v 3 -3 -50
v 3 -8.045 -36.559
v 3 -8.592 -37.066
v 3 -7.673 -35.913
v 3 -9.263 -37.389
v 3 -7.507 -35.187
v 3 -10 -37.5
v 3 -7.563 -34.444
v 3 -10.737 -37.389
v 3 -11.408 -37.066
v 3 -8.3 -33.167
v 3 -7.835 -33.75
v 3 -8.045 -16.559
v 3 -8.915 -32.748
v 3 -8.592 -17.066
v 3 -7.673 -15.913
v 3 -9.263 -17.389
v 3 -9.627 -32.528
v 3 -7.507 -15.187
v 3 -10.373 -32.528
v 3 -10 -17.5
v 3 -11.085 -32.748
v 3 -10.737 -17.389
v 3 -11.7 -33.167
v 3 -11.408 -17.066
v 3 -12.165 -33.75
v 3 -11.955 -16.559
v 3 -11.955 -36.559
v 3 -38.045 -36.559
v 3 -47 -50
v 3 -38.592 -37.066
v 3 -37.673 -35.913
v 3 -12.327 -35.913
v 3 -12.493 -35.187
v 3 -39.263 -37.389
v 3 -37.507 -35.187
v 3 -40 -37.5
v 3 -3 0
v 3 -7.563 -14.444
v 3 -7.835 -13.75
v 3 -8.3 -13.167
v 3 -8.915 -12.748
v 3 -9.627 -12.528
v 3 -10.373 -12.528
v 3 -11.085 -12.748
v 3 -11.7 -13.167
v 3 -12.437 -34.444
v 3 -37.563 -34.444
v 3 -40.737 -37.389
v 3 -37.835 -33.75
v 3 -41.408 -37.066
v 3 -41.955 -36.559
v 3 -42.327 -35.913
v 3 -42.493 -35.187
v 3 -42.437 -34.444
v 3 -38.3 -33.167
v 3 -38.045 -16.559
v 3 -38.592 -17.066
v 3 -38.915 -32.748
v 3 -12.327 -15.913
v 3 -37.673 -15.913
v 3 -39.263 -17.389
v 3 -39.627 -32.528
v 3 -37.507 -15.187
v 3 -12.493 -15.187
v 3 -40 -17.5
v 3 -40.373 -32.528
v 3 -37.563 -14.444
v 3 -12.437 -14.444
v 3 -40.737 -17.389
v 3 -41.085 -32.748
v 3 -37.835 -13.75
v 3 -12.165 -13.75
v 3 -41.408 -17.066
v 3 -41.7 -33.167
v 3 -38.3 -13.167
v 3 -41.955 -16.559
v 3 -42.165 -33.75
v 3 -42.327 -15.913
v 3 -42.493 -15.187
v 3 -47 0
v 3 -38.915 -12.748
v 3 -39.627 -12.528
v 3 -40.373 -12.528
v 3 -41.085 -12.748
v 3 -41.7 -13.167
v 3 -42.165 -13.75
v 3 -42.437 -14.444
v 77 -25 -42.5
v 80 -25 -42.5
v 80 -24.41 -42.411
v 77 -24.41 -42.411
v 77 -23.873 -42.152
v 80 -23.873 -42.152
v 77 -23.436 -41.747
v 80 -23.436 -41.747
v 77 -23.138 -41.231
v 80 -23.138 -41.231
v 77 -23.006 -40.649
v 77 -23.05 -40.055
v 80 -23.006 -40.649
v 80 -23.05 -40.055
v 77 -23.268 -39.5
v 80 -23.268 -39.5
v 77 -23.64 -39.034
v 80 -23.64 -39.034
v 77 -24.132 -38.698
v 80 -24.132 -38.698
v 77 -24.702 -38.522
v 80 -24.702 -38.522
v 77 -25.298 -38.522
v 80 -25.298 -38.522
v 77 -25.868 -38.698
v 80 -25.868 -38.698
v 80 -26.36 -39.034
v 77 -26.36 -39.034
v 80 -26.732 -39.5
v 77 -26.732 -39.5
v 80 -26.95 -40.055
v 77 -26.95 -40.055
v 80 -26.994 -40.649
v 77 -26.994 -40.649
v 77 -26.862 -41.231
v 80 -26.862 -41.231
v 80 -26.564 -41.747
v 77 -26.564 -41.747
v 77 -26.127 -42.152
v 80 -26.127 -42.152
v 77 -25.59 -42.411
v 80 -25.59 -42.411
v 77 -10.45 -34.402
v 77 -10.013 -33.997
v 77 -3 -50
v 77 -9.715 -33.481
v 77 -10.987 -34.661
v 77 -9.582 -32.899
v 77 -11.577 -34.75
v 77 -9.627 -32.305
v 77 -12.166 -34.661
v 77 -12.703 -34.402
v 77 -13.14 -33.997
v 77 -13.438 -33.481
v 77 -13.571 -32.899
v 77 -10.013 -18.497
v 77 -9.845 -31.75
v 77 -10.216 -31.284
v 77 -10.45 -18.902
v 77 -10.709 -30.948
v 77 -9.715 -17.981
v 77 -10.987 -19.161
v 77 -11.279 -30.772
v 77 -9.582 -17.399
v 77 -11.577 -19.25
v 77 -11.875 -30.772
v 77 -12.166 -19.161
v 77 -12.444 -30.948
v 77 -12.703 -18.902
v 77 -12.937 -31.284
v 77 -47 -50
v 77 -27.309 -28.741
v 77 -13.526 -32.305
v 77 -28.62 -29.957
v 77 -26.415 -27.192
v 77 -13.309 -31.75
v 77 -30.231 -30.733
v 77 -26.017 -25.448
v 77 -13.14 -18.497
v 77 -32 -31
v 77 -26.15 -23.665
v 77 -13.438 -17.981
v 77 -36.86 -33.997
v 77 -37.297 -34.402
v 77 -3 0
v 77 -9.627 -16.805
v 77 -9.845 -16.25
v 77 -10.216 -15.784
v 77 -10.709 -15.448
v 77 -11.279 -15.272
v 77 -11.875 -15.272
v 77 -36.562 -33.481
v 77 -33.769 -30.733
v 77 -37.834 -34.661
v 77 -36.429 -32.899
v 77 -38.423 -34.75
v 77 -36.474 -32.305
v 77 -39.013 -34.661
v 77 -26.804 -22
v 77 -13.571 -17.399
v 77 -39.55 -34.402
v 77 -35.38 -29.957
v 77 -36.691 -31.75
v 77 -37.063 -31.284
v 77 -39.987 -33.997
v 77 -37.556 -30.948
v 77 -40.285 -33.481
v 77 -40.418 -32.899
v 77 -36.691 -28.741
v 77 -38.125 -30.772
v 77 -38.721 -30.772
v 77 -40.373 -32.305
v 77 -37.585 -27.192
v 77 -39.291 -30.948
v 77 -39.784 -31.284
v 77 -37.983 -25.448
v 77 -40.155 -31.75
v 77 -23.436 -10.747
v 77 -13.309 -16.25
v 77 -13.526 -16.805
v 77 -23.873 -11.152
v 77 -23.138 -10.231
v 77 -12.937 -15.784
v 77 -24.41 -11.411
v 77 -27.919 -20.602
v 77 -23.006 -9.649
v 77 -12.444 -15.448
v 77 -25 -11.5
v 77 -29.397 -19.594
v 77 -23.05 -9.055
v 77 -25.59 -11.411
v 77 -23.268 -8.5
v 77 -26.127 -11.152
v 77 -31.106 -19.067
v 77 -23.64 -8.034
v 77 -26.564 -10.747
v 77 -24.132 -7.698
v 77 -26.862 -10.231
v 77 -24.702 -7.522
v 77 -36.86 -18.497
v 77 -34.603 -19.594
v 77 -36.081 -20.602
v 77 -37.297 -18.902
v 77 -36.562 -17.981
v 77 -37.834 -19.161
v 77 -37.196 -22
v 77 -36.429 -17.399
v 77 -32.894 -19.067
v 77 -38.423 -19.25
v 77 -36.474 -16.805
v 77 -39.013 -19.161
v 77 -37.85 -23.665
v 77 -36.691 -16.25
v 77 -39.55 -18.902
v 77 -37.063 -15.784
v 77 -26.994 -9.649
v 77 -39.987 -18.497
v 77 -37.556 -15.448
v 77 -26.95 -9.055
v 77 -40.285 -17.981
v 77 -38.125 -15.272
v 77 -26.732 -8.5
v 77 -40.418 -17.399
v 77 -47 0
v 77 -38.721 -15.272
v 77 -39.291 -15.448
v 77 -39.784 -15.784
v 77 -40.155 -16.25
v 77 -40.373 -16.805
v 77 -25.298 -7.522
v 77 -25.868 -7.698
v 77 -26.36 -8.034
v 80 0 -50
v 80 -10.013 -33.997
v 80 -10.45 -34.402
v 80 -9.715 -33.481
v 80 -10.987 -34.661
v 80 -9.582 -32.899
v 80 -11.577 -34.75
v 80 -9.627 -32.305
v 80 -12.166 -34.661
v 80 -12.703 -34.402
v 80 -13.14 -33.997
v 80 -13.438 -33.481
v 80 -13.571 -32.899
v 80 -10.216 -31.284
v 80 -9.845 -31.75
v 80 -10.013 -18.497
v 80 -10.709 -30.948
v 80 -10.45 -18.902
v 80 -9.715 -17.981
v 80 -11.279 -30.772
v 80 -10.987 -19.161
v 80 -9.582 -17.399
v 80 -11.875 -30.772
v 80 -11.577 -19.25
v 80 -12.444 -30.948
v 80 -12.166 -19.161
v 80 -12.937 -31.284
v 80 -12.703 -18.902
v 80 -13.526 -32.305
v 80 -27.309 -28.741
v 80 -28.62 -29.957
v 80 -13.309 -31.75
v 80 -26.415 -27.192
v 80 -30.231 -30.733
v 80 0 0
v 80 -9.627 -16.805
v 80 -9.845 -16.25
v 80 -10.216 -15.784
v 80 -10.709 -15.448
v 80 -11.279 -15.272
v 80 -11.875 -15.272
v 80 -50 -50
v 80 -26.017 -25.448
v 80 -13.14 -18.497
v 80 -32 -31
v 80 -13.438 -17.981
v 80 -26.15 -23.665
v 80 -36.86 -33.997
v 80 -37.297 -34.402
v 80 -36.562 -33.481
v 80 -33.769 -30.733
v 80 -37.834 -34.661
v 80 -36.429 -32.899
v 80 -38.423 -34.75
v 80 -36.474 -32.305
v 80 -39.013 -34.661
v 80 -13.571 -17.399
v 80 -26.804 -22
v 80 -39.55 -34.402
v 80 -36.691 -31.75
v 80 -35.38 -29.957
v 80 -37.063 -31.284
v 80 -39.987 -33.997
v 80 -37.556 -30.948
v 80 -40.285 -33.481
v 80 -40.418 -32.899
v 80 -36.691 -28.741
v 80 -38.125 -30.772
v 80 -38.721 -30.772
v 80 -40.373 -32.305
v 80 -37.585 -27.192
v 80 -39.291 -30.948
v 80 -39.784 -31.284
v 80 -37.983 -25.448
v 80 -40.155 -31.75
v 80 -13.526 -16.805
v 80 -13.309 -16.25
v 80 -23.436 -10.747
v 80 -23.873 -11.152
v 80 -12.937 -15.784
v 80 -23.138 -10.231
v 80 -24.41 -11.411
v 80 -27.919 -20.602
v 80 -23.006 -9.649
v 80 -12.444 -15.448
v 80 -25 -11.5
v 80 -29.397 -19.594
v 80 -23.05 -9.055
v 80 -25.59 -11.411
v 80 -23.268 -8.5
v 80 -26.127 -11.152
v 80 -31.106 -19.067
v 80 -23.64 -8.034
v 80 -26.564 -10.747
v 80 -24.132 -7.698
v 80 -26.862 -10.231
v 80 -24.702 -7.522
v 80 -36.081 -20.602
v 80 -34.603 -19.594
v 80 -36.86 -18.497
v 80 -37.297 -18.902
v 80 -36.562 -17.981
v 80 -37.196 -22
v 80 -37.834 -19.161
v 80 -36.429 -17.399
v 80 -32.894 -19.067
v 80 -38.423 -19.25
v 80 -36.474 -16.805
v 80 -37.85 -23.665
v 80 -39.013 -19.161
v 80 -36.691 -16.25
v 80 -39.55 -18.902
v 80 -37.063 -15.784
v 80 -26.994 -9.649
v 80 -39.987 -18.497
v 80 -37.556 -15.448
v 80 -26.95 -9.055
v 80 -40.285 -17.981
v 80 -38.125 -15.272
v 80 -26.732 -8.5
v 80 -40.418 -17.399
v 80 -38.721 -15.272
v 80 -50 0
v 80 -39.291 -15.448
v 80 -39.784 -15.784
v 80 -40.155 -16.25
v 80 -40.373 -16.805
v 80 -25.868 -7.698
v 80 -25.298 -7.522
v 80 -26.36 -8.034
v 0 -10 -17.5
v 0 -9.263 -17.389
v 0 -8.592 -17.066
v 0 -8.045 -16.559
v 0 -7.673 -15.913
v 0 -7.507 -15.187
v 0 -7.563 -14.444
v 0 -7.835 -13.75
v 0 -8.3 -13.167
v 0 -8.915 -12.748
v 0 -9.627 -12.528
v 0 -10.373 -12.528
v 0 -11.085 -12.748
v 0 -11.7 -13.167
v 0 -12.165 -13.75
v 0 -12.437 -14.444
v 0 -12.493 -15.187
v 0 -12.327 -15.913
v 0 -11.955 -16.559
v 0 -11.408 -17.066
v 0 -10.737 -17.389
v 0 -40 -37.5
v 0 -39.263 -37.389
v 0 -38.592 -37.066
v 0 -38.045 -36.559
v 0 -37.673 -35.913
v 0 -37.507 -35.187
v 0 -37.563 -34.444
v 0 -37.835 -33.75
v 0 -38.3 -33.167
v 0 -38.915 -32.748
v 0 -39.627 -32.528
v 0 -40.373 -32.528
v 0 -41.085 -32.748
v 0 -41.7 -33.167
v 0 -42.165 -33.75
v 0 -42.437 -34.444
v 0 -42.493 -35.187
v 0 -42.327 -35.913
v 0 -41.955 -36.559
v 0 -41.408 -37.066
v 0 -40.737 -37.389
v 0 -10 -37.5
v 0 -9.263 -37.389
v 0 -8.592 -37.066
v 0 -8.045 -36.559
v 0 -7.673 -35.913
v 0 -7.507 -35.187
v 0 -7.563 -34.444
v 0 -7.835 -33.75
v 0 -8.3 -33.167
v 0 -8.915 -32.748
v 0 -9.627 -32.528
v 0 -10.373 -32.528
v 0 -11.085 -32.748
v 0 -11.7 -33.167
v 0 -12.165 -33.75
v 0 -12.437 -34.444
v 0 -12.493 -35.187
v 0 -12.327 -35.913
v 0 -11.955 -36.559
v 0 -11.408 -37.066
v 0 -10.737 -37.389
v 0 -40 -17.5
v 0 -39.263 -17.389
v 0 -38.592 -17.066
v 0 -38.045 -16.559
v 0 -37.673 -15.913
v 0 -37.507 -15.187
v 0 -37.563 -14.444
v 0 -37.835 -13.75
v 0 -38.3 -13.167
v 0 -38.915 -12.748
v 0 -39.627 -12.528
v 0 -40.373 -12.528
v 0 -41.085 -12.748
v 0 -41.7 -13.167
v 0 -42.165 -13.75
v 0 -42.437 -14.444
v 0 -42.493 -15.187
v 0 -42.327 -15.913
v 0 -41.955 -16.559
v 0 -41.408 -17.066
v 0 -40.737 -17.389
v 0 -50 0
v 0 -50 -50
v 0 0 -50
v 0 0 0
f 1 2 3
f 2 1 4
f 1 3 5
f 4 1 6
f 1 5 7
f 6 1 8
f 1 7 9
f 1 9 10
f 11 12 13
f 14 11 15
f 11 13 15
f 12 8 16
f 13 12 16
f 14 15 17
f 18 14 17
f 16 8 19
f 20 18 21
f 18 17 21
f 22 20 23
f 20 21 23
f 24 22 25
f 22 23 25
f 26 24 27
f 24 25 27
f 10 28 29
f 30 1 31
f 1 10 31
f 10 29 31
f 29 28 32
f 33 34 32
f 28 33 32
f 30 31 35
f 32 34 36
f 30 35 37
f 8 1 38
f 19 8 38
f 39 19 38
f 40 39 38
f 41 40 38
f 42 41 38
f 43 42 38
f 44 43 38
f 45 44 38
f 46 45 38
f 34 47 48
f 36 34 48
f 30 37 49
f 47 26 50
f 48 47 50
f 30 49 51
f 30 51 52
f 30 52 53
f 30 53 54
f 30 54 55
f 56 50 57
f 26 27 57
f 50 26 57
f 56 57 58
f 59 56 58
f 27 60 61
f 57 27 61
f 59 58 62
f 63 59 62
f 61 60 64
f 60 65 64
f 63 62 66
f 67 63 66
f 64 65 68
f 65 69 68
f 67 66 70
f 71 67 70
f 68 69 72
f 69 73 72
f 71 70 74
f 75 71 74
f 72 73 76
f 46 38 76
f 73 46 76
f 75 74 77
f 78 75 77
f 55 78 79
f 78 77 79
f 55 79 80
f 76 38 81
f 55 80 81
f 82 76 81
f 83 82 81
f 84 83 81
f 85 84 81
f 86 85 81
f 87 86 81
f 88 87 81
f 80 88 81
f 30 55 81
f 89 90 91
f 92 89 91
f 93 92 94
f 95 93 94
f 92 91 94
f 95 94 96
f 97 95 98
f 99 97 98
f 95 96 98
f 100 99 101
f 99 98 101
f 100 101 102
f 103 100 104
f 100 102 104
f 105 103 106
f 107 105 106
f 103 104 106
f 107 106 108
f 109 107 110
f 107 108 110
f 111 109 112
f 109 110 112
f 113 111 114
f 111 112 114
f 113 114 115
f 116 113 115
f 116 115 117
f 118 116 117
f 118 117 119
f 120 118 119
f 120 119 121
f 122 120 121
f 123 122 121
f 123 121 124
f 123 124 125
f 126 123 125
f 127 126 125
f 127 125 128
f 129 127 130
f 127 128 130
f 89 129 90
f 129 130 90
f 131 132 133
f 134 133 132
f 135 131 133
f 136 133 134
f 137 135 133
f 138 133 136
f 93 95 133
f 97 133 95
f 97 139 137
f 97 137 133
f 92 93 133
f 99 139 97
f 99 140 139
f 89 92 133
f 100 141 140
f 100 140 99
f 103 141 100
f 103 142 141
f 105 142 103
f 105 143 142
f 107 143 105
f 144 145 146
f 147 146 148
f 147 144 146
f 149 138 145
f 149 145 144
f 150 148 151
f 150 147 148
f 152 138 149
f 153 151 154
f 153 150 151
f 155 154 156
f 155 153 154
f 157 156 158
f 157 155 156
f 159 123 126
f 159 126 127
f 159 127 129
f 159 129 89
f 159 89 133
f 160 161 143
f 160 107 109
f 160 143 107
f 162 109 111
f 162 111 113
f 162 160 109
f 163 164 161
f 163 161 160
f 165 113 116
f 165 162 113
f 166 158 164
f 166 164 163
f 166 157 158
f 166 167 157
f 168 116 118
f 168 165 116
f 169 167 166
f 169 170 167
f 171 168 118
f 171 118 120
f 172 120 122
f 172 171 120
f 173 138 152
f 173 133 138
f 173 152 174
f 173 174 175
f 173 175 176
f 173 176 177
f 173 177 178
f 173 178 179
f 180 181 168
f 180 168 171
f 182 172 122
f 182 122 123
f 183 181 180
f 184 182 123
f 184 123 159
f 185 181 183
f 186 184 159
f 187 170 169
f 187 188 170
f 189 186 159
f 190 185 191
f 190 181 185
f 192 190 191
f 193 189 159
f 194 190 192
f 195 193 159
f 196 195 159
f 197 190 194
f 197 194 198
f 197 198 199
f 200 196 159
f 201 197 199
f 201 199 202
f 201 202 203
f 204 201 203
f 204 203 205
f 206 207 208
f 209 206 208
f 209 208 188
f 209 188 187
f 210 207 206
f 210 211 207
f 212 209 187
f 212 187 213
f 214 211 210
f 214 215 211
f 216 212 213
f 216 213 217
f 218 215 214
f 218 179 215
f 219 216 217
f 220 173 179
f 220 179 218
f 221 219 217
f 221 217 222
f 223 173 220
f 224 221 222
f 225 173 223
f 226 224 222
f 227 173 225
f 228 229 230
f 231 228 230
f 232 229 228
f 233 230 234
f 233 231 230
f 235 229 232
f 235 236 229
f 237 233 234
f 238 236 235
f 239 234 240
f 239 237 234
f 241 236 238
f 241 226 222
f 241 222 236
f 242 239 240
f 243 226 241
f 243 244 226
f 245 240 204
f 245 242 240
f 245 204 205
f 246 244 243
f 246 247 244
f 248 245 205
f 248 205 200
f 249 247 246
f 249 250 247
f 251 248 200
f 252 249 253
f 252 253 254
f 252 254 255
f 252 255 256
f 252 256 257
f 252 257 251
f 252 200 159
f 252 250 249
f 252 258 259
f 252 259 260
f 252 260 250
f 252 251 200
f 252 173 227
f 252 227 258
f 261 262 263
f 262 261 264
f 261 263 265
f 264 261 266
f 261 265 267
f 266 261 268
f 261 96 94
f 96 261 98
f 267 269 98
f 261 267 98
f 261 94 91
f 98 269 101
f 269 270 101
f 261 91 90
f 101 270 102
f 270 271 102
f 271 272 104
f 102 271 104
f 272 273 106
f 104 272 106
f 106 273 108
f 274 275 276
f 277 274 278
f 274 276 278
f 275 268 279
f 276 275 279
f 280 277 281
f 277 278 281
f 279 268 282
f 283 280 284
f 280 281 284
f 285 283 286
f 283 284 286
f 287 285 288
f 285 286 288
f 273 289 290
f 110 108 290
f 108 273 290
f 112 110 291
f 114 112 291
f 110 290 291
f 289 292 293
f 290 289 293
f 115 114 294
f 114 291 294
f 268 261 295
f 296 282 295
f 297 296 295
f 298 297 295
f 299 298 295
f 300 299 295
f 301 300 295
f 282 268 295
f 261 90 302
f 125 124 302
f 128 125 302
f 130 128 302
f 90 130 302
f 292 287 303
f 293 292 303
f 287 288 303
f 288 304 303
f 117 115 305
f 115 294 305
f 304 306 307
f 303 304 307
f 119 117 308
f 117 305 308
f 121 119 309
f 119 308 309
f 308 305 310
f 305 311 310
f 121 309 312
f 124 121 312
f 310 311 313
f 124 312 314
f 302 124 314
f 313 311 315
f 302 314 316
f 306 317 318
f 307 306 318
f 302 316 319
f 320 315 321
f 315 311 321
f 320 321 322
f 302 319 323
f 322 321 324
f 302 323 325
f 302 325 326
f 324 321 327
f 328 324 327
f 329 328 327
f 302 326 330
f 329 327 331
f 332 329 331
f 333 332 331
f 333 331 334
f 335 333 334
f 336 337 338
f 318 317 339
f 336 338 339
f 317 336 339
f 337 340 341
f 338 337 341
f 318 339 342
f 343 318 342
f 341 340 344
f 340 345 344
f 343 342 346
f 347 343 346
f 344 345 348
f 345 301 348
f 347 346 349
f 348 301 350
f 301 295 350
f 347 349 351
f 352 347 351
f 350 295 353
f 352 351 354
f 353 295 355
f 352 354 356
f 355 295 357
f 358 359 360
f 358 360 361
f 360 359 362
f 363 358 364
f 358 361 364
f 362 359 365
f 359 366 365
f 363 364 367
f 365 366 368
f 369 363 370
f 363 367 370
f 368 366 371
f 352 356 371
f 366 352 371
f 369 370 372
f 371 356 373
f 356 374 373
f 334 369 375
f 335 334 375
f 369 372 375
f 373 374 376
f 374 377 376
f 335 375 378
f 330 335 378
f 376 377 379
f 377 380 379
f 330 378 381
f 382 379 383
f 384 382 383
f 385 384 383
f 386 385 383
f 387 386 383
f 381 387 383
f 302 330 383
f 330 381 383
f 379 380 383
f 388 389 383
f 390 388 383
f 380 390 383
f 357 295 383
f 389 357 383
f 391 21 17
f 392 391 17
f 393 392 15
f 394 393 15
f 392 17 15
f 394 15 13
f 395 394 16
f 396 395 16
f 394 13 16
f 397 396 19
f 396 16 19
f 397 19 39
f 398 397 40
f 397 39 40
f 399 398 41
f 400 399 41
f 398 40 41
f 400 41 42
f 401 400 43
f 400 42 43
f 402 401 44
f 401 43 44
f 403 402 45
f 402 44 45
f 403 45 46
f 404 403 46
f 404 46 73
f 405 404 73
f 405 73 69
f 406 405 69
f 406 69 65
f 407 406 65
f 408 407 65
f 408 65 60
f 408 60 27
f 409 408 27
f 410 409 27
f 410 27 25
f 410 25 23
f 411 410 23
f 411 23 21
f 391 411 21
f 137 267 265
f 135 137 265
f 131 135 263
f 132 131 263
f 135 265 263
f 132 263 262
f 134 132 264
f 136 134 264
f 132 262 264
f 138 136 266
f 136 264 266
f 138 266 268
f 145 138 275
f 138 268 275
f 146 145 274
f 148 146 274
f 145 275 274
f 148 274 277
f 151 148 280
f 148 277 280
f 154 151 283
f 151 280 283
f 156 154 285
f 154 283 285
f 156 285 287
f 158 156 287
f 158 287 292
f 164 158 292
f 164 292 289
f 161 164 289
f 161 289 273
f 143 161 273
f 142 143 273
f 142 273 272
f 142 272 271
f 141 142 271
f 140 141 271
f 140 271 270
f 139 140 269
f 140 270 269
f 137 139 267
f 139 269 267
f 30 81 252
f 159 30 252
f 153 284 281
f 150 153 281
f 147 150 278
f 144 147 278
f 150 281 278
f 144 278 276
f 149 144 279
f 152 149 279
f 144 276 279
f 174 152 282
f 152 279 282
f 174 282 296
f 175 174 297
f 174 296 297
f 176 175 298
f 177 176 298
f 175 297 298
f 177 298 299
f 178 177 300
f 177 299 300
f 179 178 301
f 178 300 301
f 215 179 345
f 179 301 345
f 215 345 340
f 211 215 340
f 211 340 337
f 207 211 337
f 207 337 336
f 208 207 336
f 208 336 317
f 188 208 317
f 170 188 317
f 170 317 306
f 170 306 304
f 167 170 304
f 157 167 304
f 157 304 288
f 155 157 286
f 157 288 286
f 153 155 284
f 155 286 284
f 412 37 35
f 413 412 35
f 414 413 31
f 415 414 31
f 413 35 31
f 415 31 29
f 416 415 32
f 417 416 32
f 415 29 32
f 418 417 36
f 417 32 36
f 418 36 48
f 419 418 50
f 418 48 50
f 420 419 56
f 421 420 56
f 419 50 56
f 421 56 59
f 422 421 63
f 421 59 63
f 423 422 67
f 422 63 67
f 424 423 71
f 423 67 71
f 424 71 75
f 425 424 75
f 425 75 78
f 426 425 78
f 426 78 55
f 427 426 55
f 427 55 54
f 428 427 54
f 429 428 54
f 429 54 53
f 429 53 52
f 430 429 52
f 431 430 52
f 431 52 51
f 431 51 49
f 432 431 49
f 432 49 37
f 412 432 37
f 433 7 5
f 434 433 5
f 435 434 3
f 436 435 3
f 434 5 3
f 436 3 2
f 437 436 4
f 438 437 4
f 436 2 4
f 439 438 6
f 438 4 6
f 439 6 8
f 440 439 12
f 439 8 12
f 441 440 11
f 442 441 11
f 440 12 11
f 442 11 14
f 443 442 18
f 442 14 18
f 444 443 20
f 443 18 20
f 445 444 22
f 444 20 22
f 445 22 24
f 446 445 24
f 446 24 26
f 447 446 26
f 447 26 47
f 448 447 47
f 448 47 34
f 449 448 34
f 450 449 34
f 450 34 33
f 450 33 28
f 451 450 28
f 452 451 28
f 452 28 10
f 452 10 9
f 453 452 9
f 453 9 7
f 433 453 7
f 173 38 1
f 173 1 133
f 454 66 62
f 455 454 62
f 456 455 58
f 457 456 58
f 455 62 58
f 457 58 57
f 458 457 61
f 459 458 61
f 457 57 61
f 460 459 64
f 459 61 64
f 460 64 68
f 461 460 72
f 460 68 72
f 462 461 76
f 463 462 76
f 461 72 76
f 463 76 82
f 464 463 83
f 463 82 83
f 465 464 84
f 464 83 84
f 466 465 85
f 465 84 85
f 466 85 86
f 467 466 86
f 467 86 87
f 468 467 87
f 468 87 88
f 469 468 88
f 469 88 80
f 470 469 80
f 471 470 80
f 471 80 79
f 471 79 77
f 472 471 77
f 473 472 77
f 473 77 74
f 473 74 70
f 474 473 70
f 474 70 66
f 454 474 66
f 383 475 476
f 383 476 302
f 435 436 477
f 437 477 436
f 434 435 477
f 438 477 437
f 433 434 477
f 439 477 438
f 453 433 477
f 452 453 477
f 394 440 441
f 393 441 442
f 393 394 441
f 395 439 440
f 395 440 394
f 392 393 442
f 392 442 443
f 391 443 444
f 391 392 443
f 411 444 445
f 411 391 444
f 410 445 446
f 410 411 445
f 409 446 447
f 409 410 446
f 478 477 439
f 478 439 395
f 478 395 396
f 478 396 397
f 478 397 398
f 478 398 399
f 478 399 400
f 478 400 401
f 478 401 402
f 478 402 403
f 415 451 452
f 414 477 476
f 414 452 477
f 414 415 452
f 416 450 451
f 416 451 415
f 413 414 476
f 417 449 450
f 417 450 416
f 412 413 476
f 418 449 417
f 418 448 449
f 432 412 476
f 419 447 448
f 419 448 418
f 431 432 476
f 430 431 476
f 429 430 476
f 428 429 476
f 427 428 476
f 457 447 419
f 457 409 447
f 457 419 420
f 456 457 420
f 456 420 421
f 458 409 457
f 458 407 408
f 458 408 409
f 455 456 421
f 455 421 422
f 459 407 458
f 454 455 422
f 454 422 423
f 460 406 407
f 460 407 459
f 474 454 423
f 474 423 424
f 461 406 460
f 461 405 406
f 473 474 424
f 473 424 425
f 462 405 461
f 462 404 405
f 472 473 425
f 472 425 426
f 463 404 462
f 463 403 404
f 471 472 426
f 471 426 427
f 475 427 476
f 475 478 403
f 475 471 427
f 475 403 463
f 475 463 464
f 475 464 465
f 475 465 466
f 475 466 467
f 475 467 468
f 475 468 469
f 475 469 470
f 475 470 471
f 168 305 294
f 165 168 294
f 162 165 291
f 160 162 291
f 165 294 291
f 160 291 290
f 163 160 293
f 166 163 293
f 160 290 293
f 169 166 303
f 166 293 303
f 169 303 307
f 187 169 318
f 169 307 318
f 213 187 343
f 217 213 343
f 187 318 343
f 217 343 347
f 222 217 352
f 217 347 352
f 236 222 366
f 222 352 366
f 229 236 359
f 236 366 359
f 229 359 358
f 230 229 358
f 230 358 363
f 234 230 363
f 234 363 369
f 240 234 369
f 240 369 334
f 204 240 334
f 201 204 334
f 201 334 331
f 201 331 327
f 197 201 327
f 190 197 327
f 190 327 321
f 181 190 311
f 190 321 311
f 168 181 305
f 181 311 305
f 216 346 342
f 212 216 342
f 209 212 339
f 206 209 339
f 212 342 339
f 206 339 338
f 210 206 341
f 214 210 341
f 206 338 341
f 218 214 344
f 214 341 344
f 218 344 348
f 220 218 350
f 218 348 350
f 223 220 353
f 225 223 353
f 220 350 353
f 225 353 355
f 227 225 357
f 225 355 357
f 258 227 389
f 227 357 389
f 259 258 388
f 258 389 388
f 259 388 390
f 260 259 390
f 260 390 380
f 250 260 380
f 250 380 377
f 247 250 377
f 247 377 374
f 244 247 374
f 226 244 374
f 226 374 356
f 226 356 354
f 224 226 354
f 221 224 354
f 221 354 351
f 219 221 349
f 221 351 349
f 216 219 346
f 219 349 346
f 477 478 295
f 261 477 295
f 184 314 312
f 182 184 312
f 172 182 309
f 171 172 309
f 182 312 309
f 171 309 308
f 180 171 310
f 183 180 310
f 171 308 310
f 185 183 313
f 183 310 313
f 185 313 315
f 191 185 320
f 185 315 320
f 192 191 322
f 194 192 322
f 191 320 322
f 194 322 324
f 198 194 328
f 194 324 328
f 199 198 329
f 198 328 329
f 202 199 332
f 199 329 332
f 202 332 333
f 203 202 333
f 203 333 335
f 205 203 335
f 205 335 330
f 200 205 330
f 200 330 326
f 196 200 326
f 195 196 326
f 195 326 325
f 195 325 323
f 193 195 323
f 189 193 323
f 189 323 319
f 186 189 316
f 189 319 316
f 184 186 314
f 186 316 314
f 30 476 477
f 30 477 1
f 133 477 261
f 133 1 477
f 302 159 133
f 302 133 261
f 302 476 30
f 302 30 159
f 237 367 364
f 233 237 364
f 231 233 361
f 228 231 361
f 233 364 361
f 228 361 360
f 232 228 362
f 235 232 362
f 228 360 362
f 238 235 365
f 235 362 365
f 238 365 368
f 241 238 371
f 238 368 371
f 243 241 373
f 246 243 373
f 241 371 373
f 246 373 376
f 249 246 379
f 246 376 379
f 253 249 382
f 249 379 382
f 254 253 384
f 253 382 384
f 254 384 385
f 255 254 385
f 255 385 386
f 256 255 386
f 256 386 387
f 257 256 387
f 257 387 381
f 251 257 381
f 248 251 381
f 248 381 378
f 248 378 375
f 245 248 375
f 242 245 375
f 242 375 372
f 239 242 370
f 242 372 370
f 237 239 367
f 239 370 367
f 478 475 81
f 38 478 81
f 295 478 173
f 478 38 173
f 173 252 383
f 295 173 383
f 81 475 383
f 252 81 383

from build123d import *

# Parameters (mm, degrees)
SKETCH1_W           = 80
SKETCH1_H           = 50
SKETCH1_W_2         = 74
SKETCH1_H_2         = 44
BOSS_EXTRUDE1_DEPTH = 50
SKETCH2_R           = 2
SKETCH2_R_2         = 6
CUT_EXTRUDE1_DEPTH  = 3
CUT_EXTRUDE2_REACH  = 5
SKETCH3_R           = 2.5


with BuildPart() as part:
    # Sketch1 → Boss-Extrude1 (new body)
    with BuildSketch(Plane(origin=(0, 0, 0), x_dir=(1, 0, 0), z_dir=(0, 0, -1))):
        with Locations((40, 25)):
            Rectangle(SKETCH1_W, SKETCH1_H)
        with Locations((40, 25)):
            Rectangle(SKETCH1_W_2, SKETCH1_H_2, mode=Mode.SUBTRACT)
    extrude(amount=BOSS_EXTRUDE1_DEPTH)

    # Sketch2 → Cut-Extrude1 (cut)
    with BuildSketch(Plane(origin=(80, 0, 0), x_dir=(0, 0, -1), z_dir=(1, 0, 0))):
        with Locations((9.5, -25)):
            Circle(SKETCH2_R)
        with Locations((17.25, -38.423393759)):
            Circle(SKETCH2_R)
        with Locations((32.75, -38.423393759)):
            Circle(SKETCH2_R)
        with Locations((40.5, -25)):
            Circle(SKETCH2_R)
        with Locations((32.75, -11.576606241)):
            Circle(SKETCH2_R)
        with Locations((17.25, -11.576606241)):
            Circle(SKETCH2_R)
        with Locations((25, -32)):
            Circle(SKETCH2_R_2)
    extrude(amount=-CUT_EXTRUDE1_DEPTH, mode=Mode.SUBTRACT)

    # Sketch3 → Cut-Extrude2 (cut, up to next)
    with BuildSketch(Plane(origin=(3, 0, 0), x_dir=(0, 0, -1), z_dir=(1, 0, 0)), mode=Mode.PRIVATE) as cut_extrude2_sk1:
        with Locations((15, -40)):
            Circle(SKETCH3_R)
    cut_extrude2_tool1 = extrude(cut_extrude2_sk1.sketch, amount=-CUT_EXTRUDE2_REACH, mode=Mode.PRIVATE) & part.part
    add(cut_extrude2_tool1.solids().sort_by_distance((3, -40, -15))[0], mode=Mode.SUBTRACT)
    # Sketch3 → Cut-Extrude2 (cut, up to next)
    with BuildSketch(Plane(origin=(3, 0, 0), x_dir=(0, 0, -1), z_dir=(1, 0, 0)), mode=Mode.PRIVATE) as cut_extrude2_sk2:
        with Locations((15, -10)):
            Circle(SKETCH3_R)
    cut_extrude2_tool2 = extrude(cut_extrude2_sk2.sketch, amount=-CUT_EXTRUDE2_REACH, mode=Mode.PRIVATE) & part.part
    add(cut_extrude2_tool2.solids().sort_by_distance((3, -10, -15))[0], mode=Mode.SUBTRACT)
    # Sketch3 → Cut-Extrude2 (cut, up to next)
    with BuildSketch(Plane(origin=(3, 0, 0), x_dir=(0, 0, -1), z_dir=(1, 0, 0)), mode=Mode.PRIVATE) as cut_extrude2_sk3:
        with Locations((35, -10)):
            Circle(SKETCH3_R)
    cut_extrude2_tool3 = extrude(cut_extrude2_sk3.sketch, amount=-CUT_EXTRUDE2_REACH, mode=Mode.PRIVATE) & part.part
    add(cut_extrude2_tool3.solids().sort_by_distance((3, -10, -35))[0], mode=Mode.SUBTRACT)
    # Sketch3 → Cut-Extrude2 (cut, up to next)
    with BuildSketch(Plane(origin=(3, 0, 0), x_dir=(0, 0, -1), z_dir=(1, 0, 0)), mode=Mode.PRIVATE) as cut_extrude2_sk4:
        with Locations((35, -40)):
            Circle(SKETCH3_R)
    cut_extrude2_tool4 = extrude(cut_extrude2_sk4.sketch, amount=-CUT_EXTRUDE2_REACH, mode=Mode.PRIVATE) & part.part
    add(cut_extrude2_tool4.solids().sort_by_distance((3, -40, -35))[0], mode=Mode.SUBTRACT)


solid = part.part
